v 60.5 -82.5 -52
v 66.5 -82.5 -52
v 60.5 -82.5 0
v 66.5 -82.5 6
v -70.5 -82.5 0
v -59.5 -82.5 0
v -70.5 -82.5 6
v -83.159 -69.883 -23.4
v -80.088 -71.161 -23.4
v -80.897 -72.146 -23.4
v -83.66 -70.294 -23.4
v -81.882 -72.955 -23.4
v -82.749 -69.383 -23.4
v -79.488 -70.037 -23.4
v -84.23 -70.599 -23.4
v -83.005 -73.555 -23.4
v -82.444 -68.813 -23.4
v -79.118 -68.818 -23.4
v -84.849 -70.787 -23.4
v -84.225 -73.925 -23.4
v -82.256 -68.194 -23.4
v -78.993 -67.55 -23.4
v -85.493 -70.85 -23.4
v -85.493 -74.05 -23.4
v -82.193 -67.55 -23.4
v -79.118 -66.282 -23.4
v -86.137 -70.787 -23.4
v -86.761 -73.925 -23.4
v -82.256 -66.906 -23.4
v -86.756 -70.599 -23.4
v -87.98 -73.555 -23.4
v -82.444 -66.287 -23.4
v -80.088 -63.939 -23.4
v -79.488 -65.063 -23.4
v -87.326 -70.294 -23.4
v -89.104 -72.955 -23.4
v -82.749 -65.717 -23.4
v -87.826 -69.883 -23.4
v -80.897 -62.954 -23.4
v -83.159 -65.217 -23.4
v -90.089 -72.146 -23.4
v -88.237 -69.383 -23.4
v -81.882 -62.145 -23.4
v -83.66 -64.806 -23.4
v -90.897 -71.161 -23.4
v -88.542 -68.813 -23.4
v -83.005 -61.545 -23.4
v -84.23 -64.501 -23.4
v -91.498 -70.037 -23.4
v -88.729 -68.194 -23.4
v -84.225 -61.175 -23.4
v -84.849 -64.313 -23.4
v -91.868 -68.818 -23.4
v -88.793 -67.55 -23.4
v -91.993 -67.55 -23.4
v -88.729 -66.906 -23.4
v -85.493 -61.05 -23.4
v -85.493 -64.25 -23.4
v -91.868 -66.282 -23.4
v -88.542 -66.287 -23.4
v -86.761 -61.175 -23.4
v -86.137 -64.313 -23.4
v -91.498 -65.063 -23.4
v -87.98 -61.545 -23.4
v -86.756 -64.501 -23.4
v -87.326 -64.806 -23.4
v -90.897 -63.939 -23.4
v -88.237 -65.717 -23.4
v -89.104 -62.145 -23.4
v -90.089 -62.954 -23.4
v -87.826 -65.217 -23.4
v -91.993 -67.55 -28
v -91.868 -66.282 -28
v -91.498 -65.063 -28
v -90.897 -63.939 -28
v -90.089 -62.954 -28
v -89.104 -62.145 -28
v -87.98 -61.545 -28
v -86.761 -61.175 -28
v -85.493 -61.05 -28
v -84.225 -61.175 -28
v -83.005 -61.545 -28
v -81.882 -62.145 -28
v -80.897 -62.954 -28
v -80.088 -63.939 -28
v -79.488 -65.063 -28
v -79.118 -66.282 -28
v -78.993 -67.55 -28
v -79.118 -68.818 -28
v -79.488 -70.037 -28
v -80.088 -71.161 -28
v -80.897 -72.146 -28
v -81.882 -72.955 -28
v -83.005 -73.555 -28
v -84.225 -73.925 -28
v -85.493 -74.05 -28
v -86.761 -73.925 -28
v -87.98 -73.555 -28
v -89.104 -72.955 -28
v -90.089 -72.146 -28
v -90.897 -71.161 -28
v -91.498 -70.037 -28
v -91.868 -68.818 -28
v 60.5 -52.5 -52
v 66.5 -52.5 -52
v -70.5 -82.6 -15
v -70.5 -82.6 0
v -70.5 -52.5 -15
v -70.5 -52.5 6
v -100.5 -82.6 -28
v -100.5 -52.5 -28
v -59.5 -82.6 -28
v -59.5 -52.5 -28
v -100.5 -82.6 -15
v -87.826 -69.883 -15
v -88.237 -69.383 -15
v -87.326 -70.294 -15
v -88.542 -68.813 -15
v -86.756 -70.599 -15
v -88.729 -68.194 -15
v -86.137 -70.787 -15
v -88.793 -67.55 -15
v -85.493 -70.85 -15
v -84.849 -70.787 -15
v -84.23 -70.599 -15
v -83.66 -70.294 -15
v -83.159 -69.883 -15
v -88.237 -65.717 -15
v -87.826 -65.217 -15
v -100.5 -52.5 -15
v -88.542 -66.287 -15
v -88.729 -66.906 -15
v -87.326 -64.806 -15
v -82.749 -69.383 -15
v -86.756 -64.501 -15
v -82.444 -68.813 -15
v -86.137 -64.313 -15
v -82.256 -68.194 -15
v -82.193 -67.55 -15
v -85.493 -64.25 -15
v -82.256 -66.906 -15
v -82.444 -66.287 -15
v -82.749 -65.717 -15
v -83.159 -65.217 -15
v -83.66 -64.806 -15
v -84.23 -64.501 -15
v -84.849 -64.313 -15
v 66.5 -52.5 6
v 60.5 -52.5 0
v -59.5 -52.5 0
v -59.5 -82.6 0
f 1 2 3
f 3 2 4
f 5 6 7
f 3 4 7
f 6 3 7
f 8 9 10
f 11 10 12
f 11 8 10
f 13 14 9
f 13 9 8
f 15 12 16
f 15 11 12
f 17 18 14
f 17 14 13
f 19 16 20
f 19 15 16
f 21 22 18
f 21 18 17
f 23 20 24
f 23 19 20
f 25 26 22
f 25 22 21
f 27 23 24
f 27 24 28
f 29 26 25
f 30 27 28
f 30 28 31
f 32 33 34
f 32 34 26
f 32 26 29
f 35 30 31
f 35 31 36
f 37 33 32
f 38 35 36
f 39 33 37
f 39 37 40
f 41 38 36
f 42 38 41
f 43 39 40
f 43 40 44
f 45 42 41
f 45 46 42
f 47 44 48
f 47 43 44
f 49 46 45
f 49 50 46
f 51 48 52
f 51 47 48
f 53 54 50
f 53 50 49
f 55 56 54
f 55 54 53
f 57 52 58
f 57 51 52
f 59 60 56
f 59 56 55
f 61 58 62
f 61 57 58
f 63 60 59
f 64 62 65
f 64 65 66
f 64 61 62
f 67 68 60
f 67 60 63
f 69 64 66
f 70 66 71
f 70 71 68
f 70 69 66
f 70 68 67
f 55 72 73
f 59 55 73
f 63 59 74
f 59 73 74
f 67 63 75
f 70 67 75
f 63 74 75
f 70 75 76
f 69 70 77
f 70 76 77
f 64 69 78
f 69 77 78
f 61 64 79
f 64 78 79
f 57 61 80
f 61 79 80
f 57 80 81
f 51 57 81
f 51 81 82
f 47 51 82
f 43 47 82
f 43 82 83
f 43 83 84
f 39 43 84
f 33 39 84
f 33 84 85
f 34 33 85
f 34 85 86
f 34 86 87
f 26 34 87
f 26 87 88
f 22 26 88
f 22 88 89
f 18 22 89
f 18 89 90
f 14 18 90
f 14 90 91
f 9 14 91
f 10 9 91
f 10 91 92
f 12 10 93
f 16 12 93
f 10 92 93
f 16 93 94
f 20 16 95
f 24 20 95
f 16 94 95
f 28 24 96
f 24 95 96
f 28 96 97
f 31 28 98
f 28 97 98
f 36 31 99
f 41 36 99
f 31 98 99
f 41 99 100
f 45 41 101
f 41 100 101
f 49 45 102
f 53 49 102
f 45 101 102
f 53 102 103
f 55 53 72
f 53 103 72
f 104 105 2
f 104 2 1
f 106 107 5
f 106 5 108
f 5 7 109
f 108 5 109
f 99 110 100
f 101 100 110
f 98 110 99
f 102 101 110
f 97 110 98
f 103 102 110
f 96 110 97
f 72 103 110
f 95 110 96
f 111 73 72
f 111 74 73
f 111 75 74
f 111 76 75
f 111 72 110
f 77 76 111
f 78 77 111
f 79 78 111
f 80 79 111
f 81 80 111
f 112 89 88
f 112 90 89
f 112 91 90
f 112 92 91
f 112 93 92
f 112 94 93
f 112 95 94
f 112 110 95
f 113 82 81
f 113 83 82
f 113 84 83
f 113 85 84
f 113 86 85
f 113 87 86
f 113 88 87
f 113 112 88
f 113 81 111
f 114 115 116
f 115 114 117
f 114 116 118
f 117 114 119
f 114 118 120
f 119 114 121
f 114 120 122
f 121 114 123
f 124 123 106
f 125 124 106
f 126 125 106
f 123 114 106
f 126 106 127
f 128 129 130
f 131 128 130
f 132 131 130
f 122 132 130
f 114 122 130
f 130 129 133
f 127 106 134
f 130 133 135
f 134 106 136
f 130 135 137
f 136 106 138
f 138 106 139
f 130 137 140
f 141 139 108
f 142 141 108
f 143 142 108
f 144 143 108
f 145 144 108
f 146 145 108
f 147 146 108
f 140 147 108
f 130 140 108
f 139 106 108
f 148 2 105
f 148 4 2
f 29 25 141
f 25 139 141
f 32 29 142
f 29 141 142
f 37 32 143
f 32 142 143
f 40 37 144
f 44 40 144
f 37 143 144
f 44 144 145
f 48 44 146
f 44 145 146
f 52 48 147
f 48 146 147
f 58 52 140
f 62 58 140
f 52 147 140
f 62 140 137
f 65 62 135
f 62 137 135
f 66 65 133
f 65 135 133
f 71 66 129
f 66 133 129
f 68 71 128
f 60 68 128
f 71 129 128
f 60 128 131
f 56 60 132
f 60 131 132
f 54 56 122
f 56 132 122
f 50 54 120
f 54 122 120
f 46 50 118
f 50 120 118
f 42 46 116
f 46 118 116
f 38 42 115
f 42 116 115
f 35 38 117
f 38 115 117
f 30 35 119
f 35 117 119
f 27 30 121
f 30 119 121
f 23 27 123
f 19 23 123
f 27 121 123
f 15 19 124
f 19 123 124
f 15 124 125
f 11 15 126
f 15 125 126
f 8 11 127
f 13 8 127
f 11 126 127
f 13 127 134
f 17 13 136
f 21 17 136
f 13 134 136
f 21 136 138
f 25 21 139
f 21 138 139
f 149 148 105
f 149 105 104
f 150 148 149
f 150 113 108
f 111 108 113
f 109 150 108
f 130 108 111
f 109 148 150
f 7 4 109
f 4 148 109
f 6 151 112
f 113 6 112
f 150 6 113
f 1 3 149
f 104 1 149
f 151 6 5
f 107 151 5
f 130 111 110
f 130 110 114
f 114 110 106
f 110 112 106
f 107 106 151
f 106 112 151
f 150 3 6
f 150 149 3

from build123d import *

# Parameters (mm, degrees)
RESSALTO_EXTRUS_O1_DEPTH                             = 6
ESBO_O2_W                                            = 11
ESBO_O2_H                                            = 30.1
RESSALTO_EXTRUS_O2_DEPTH                             = 28
ESBO_O3_W                                            = 13
ESBO_O3_H                                            = 30.1
RESSALTO_EXTRUS_O3_DEPTH                             = 30
REBAIXO_PARA_PARAFUSO_DE_M_QUINA_COM_CAB_D           = 6.6
REBAIXO_PARA_PARAFUSO_DE_M_QUINA_COM_CAB_CBORE_D     = 13
REBAIXO_PARA_PARAFUSO_DE_M_QUINA_COM_CAB_CBORE_DEPTH = 4.6
ESBO_O7_W                                            = 6
ESBO_O7_H                                            = 30
RESSALTO_EXTRUS_O4_DEPTH                             = 52


with BuildPart() as part:
    # Esboço1 → Ressalto-extrusão1 (new body)
    with BuildSketch(Plane.XY):
        Polygon((59.5, -82.5), (-70.5, -82.5), (-70.5, -52.5), (59.5, -52.5), (66.5, -52.5), (66.5, -82.5), align=None)
    extrude(amount=RESSALTO_EXTRUS_O1_DEPTH)

    # Esboço2 → Ressalto-extrusão2 (add)
    with BuildSketch(Plane(origin=(0, 0, 0), x_dir=(-1, 0, 0), z_dir=(0, 0, -1))):
        with Locations((65, -67.55)):
            Rectangle(ESBO_O2_W, ESBO_O2_H)
    extrude(amount=RESSALTO_EXTRUS_O2_DEPTH)

    # Esboço3 → Ressalto-extrusão3 (add)
    with BuildSketch(Plane.ZY.offset(70.5)):
        with Locations((-21.5, -67.55)):
            Rectangle(ESBO_O3_W, ESBO_O3_H)
    extrude(amount=RESSALTO_EXTRUS_O3_DEPTH)

    # Rebaixo para parafuso de máquina com cabeça panela de M61 (through all)
    with Locations(Plane(origin=(-85.492891977, -67.55, -28), x_dir=(-1, 0, 0), z_dir=(0, 0, -1))):
        with Locations((0, 0)):
            CounterBoreHole(REBAIXO_PARA_PARAFUSO_DE_M_QUINA_COM_CAB_D / 2, REBAIXO_PARA_PARAFUSO_DE_M_QUINA_COM_CAB_CBORE_D / 2, REBAIXO_PARA_PARAFUSO_DE_M_QUINA_COM_CAB_CBORE_DEPTH)

    # Esboço7 → Ressalto-extrusão4 (add)
    with BuildSketch(Plane(origin=(0, 0, 0), x_dir=(-1, 0, 0), z_dir=(0, 0, -1))):
        with Locations((-63.5, -67.5)):
            Rectangle(ESBO_O7_W, ESBO_O7_H)
    extrude(amount=RESSALTO_EXTRUS_O4_DEPTH)


solid = part.part
